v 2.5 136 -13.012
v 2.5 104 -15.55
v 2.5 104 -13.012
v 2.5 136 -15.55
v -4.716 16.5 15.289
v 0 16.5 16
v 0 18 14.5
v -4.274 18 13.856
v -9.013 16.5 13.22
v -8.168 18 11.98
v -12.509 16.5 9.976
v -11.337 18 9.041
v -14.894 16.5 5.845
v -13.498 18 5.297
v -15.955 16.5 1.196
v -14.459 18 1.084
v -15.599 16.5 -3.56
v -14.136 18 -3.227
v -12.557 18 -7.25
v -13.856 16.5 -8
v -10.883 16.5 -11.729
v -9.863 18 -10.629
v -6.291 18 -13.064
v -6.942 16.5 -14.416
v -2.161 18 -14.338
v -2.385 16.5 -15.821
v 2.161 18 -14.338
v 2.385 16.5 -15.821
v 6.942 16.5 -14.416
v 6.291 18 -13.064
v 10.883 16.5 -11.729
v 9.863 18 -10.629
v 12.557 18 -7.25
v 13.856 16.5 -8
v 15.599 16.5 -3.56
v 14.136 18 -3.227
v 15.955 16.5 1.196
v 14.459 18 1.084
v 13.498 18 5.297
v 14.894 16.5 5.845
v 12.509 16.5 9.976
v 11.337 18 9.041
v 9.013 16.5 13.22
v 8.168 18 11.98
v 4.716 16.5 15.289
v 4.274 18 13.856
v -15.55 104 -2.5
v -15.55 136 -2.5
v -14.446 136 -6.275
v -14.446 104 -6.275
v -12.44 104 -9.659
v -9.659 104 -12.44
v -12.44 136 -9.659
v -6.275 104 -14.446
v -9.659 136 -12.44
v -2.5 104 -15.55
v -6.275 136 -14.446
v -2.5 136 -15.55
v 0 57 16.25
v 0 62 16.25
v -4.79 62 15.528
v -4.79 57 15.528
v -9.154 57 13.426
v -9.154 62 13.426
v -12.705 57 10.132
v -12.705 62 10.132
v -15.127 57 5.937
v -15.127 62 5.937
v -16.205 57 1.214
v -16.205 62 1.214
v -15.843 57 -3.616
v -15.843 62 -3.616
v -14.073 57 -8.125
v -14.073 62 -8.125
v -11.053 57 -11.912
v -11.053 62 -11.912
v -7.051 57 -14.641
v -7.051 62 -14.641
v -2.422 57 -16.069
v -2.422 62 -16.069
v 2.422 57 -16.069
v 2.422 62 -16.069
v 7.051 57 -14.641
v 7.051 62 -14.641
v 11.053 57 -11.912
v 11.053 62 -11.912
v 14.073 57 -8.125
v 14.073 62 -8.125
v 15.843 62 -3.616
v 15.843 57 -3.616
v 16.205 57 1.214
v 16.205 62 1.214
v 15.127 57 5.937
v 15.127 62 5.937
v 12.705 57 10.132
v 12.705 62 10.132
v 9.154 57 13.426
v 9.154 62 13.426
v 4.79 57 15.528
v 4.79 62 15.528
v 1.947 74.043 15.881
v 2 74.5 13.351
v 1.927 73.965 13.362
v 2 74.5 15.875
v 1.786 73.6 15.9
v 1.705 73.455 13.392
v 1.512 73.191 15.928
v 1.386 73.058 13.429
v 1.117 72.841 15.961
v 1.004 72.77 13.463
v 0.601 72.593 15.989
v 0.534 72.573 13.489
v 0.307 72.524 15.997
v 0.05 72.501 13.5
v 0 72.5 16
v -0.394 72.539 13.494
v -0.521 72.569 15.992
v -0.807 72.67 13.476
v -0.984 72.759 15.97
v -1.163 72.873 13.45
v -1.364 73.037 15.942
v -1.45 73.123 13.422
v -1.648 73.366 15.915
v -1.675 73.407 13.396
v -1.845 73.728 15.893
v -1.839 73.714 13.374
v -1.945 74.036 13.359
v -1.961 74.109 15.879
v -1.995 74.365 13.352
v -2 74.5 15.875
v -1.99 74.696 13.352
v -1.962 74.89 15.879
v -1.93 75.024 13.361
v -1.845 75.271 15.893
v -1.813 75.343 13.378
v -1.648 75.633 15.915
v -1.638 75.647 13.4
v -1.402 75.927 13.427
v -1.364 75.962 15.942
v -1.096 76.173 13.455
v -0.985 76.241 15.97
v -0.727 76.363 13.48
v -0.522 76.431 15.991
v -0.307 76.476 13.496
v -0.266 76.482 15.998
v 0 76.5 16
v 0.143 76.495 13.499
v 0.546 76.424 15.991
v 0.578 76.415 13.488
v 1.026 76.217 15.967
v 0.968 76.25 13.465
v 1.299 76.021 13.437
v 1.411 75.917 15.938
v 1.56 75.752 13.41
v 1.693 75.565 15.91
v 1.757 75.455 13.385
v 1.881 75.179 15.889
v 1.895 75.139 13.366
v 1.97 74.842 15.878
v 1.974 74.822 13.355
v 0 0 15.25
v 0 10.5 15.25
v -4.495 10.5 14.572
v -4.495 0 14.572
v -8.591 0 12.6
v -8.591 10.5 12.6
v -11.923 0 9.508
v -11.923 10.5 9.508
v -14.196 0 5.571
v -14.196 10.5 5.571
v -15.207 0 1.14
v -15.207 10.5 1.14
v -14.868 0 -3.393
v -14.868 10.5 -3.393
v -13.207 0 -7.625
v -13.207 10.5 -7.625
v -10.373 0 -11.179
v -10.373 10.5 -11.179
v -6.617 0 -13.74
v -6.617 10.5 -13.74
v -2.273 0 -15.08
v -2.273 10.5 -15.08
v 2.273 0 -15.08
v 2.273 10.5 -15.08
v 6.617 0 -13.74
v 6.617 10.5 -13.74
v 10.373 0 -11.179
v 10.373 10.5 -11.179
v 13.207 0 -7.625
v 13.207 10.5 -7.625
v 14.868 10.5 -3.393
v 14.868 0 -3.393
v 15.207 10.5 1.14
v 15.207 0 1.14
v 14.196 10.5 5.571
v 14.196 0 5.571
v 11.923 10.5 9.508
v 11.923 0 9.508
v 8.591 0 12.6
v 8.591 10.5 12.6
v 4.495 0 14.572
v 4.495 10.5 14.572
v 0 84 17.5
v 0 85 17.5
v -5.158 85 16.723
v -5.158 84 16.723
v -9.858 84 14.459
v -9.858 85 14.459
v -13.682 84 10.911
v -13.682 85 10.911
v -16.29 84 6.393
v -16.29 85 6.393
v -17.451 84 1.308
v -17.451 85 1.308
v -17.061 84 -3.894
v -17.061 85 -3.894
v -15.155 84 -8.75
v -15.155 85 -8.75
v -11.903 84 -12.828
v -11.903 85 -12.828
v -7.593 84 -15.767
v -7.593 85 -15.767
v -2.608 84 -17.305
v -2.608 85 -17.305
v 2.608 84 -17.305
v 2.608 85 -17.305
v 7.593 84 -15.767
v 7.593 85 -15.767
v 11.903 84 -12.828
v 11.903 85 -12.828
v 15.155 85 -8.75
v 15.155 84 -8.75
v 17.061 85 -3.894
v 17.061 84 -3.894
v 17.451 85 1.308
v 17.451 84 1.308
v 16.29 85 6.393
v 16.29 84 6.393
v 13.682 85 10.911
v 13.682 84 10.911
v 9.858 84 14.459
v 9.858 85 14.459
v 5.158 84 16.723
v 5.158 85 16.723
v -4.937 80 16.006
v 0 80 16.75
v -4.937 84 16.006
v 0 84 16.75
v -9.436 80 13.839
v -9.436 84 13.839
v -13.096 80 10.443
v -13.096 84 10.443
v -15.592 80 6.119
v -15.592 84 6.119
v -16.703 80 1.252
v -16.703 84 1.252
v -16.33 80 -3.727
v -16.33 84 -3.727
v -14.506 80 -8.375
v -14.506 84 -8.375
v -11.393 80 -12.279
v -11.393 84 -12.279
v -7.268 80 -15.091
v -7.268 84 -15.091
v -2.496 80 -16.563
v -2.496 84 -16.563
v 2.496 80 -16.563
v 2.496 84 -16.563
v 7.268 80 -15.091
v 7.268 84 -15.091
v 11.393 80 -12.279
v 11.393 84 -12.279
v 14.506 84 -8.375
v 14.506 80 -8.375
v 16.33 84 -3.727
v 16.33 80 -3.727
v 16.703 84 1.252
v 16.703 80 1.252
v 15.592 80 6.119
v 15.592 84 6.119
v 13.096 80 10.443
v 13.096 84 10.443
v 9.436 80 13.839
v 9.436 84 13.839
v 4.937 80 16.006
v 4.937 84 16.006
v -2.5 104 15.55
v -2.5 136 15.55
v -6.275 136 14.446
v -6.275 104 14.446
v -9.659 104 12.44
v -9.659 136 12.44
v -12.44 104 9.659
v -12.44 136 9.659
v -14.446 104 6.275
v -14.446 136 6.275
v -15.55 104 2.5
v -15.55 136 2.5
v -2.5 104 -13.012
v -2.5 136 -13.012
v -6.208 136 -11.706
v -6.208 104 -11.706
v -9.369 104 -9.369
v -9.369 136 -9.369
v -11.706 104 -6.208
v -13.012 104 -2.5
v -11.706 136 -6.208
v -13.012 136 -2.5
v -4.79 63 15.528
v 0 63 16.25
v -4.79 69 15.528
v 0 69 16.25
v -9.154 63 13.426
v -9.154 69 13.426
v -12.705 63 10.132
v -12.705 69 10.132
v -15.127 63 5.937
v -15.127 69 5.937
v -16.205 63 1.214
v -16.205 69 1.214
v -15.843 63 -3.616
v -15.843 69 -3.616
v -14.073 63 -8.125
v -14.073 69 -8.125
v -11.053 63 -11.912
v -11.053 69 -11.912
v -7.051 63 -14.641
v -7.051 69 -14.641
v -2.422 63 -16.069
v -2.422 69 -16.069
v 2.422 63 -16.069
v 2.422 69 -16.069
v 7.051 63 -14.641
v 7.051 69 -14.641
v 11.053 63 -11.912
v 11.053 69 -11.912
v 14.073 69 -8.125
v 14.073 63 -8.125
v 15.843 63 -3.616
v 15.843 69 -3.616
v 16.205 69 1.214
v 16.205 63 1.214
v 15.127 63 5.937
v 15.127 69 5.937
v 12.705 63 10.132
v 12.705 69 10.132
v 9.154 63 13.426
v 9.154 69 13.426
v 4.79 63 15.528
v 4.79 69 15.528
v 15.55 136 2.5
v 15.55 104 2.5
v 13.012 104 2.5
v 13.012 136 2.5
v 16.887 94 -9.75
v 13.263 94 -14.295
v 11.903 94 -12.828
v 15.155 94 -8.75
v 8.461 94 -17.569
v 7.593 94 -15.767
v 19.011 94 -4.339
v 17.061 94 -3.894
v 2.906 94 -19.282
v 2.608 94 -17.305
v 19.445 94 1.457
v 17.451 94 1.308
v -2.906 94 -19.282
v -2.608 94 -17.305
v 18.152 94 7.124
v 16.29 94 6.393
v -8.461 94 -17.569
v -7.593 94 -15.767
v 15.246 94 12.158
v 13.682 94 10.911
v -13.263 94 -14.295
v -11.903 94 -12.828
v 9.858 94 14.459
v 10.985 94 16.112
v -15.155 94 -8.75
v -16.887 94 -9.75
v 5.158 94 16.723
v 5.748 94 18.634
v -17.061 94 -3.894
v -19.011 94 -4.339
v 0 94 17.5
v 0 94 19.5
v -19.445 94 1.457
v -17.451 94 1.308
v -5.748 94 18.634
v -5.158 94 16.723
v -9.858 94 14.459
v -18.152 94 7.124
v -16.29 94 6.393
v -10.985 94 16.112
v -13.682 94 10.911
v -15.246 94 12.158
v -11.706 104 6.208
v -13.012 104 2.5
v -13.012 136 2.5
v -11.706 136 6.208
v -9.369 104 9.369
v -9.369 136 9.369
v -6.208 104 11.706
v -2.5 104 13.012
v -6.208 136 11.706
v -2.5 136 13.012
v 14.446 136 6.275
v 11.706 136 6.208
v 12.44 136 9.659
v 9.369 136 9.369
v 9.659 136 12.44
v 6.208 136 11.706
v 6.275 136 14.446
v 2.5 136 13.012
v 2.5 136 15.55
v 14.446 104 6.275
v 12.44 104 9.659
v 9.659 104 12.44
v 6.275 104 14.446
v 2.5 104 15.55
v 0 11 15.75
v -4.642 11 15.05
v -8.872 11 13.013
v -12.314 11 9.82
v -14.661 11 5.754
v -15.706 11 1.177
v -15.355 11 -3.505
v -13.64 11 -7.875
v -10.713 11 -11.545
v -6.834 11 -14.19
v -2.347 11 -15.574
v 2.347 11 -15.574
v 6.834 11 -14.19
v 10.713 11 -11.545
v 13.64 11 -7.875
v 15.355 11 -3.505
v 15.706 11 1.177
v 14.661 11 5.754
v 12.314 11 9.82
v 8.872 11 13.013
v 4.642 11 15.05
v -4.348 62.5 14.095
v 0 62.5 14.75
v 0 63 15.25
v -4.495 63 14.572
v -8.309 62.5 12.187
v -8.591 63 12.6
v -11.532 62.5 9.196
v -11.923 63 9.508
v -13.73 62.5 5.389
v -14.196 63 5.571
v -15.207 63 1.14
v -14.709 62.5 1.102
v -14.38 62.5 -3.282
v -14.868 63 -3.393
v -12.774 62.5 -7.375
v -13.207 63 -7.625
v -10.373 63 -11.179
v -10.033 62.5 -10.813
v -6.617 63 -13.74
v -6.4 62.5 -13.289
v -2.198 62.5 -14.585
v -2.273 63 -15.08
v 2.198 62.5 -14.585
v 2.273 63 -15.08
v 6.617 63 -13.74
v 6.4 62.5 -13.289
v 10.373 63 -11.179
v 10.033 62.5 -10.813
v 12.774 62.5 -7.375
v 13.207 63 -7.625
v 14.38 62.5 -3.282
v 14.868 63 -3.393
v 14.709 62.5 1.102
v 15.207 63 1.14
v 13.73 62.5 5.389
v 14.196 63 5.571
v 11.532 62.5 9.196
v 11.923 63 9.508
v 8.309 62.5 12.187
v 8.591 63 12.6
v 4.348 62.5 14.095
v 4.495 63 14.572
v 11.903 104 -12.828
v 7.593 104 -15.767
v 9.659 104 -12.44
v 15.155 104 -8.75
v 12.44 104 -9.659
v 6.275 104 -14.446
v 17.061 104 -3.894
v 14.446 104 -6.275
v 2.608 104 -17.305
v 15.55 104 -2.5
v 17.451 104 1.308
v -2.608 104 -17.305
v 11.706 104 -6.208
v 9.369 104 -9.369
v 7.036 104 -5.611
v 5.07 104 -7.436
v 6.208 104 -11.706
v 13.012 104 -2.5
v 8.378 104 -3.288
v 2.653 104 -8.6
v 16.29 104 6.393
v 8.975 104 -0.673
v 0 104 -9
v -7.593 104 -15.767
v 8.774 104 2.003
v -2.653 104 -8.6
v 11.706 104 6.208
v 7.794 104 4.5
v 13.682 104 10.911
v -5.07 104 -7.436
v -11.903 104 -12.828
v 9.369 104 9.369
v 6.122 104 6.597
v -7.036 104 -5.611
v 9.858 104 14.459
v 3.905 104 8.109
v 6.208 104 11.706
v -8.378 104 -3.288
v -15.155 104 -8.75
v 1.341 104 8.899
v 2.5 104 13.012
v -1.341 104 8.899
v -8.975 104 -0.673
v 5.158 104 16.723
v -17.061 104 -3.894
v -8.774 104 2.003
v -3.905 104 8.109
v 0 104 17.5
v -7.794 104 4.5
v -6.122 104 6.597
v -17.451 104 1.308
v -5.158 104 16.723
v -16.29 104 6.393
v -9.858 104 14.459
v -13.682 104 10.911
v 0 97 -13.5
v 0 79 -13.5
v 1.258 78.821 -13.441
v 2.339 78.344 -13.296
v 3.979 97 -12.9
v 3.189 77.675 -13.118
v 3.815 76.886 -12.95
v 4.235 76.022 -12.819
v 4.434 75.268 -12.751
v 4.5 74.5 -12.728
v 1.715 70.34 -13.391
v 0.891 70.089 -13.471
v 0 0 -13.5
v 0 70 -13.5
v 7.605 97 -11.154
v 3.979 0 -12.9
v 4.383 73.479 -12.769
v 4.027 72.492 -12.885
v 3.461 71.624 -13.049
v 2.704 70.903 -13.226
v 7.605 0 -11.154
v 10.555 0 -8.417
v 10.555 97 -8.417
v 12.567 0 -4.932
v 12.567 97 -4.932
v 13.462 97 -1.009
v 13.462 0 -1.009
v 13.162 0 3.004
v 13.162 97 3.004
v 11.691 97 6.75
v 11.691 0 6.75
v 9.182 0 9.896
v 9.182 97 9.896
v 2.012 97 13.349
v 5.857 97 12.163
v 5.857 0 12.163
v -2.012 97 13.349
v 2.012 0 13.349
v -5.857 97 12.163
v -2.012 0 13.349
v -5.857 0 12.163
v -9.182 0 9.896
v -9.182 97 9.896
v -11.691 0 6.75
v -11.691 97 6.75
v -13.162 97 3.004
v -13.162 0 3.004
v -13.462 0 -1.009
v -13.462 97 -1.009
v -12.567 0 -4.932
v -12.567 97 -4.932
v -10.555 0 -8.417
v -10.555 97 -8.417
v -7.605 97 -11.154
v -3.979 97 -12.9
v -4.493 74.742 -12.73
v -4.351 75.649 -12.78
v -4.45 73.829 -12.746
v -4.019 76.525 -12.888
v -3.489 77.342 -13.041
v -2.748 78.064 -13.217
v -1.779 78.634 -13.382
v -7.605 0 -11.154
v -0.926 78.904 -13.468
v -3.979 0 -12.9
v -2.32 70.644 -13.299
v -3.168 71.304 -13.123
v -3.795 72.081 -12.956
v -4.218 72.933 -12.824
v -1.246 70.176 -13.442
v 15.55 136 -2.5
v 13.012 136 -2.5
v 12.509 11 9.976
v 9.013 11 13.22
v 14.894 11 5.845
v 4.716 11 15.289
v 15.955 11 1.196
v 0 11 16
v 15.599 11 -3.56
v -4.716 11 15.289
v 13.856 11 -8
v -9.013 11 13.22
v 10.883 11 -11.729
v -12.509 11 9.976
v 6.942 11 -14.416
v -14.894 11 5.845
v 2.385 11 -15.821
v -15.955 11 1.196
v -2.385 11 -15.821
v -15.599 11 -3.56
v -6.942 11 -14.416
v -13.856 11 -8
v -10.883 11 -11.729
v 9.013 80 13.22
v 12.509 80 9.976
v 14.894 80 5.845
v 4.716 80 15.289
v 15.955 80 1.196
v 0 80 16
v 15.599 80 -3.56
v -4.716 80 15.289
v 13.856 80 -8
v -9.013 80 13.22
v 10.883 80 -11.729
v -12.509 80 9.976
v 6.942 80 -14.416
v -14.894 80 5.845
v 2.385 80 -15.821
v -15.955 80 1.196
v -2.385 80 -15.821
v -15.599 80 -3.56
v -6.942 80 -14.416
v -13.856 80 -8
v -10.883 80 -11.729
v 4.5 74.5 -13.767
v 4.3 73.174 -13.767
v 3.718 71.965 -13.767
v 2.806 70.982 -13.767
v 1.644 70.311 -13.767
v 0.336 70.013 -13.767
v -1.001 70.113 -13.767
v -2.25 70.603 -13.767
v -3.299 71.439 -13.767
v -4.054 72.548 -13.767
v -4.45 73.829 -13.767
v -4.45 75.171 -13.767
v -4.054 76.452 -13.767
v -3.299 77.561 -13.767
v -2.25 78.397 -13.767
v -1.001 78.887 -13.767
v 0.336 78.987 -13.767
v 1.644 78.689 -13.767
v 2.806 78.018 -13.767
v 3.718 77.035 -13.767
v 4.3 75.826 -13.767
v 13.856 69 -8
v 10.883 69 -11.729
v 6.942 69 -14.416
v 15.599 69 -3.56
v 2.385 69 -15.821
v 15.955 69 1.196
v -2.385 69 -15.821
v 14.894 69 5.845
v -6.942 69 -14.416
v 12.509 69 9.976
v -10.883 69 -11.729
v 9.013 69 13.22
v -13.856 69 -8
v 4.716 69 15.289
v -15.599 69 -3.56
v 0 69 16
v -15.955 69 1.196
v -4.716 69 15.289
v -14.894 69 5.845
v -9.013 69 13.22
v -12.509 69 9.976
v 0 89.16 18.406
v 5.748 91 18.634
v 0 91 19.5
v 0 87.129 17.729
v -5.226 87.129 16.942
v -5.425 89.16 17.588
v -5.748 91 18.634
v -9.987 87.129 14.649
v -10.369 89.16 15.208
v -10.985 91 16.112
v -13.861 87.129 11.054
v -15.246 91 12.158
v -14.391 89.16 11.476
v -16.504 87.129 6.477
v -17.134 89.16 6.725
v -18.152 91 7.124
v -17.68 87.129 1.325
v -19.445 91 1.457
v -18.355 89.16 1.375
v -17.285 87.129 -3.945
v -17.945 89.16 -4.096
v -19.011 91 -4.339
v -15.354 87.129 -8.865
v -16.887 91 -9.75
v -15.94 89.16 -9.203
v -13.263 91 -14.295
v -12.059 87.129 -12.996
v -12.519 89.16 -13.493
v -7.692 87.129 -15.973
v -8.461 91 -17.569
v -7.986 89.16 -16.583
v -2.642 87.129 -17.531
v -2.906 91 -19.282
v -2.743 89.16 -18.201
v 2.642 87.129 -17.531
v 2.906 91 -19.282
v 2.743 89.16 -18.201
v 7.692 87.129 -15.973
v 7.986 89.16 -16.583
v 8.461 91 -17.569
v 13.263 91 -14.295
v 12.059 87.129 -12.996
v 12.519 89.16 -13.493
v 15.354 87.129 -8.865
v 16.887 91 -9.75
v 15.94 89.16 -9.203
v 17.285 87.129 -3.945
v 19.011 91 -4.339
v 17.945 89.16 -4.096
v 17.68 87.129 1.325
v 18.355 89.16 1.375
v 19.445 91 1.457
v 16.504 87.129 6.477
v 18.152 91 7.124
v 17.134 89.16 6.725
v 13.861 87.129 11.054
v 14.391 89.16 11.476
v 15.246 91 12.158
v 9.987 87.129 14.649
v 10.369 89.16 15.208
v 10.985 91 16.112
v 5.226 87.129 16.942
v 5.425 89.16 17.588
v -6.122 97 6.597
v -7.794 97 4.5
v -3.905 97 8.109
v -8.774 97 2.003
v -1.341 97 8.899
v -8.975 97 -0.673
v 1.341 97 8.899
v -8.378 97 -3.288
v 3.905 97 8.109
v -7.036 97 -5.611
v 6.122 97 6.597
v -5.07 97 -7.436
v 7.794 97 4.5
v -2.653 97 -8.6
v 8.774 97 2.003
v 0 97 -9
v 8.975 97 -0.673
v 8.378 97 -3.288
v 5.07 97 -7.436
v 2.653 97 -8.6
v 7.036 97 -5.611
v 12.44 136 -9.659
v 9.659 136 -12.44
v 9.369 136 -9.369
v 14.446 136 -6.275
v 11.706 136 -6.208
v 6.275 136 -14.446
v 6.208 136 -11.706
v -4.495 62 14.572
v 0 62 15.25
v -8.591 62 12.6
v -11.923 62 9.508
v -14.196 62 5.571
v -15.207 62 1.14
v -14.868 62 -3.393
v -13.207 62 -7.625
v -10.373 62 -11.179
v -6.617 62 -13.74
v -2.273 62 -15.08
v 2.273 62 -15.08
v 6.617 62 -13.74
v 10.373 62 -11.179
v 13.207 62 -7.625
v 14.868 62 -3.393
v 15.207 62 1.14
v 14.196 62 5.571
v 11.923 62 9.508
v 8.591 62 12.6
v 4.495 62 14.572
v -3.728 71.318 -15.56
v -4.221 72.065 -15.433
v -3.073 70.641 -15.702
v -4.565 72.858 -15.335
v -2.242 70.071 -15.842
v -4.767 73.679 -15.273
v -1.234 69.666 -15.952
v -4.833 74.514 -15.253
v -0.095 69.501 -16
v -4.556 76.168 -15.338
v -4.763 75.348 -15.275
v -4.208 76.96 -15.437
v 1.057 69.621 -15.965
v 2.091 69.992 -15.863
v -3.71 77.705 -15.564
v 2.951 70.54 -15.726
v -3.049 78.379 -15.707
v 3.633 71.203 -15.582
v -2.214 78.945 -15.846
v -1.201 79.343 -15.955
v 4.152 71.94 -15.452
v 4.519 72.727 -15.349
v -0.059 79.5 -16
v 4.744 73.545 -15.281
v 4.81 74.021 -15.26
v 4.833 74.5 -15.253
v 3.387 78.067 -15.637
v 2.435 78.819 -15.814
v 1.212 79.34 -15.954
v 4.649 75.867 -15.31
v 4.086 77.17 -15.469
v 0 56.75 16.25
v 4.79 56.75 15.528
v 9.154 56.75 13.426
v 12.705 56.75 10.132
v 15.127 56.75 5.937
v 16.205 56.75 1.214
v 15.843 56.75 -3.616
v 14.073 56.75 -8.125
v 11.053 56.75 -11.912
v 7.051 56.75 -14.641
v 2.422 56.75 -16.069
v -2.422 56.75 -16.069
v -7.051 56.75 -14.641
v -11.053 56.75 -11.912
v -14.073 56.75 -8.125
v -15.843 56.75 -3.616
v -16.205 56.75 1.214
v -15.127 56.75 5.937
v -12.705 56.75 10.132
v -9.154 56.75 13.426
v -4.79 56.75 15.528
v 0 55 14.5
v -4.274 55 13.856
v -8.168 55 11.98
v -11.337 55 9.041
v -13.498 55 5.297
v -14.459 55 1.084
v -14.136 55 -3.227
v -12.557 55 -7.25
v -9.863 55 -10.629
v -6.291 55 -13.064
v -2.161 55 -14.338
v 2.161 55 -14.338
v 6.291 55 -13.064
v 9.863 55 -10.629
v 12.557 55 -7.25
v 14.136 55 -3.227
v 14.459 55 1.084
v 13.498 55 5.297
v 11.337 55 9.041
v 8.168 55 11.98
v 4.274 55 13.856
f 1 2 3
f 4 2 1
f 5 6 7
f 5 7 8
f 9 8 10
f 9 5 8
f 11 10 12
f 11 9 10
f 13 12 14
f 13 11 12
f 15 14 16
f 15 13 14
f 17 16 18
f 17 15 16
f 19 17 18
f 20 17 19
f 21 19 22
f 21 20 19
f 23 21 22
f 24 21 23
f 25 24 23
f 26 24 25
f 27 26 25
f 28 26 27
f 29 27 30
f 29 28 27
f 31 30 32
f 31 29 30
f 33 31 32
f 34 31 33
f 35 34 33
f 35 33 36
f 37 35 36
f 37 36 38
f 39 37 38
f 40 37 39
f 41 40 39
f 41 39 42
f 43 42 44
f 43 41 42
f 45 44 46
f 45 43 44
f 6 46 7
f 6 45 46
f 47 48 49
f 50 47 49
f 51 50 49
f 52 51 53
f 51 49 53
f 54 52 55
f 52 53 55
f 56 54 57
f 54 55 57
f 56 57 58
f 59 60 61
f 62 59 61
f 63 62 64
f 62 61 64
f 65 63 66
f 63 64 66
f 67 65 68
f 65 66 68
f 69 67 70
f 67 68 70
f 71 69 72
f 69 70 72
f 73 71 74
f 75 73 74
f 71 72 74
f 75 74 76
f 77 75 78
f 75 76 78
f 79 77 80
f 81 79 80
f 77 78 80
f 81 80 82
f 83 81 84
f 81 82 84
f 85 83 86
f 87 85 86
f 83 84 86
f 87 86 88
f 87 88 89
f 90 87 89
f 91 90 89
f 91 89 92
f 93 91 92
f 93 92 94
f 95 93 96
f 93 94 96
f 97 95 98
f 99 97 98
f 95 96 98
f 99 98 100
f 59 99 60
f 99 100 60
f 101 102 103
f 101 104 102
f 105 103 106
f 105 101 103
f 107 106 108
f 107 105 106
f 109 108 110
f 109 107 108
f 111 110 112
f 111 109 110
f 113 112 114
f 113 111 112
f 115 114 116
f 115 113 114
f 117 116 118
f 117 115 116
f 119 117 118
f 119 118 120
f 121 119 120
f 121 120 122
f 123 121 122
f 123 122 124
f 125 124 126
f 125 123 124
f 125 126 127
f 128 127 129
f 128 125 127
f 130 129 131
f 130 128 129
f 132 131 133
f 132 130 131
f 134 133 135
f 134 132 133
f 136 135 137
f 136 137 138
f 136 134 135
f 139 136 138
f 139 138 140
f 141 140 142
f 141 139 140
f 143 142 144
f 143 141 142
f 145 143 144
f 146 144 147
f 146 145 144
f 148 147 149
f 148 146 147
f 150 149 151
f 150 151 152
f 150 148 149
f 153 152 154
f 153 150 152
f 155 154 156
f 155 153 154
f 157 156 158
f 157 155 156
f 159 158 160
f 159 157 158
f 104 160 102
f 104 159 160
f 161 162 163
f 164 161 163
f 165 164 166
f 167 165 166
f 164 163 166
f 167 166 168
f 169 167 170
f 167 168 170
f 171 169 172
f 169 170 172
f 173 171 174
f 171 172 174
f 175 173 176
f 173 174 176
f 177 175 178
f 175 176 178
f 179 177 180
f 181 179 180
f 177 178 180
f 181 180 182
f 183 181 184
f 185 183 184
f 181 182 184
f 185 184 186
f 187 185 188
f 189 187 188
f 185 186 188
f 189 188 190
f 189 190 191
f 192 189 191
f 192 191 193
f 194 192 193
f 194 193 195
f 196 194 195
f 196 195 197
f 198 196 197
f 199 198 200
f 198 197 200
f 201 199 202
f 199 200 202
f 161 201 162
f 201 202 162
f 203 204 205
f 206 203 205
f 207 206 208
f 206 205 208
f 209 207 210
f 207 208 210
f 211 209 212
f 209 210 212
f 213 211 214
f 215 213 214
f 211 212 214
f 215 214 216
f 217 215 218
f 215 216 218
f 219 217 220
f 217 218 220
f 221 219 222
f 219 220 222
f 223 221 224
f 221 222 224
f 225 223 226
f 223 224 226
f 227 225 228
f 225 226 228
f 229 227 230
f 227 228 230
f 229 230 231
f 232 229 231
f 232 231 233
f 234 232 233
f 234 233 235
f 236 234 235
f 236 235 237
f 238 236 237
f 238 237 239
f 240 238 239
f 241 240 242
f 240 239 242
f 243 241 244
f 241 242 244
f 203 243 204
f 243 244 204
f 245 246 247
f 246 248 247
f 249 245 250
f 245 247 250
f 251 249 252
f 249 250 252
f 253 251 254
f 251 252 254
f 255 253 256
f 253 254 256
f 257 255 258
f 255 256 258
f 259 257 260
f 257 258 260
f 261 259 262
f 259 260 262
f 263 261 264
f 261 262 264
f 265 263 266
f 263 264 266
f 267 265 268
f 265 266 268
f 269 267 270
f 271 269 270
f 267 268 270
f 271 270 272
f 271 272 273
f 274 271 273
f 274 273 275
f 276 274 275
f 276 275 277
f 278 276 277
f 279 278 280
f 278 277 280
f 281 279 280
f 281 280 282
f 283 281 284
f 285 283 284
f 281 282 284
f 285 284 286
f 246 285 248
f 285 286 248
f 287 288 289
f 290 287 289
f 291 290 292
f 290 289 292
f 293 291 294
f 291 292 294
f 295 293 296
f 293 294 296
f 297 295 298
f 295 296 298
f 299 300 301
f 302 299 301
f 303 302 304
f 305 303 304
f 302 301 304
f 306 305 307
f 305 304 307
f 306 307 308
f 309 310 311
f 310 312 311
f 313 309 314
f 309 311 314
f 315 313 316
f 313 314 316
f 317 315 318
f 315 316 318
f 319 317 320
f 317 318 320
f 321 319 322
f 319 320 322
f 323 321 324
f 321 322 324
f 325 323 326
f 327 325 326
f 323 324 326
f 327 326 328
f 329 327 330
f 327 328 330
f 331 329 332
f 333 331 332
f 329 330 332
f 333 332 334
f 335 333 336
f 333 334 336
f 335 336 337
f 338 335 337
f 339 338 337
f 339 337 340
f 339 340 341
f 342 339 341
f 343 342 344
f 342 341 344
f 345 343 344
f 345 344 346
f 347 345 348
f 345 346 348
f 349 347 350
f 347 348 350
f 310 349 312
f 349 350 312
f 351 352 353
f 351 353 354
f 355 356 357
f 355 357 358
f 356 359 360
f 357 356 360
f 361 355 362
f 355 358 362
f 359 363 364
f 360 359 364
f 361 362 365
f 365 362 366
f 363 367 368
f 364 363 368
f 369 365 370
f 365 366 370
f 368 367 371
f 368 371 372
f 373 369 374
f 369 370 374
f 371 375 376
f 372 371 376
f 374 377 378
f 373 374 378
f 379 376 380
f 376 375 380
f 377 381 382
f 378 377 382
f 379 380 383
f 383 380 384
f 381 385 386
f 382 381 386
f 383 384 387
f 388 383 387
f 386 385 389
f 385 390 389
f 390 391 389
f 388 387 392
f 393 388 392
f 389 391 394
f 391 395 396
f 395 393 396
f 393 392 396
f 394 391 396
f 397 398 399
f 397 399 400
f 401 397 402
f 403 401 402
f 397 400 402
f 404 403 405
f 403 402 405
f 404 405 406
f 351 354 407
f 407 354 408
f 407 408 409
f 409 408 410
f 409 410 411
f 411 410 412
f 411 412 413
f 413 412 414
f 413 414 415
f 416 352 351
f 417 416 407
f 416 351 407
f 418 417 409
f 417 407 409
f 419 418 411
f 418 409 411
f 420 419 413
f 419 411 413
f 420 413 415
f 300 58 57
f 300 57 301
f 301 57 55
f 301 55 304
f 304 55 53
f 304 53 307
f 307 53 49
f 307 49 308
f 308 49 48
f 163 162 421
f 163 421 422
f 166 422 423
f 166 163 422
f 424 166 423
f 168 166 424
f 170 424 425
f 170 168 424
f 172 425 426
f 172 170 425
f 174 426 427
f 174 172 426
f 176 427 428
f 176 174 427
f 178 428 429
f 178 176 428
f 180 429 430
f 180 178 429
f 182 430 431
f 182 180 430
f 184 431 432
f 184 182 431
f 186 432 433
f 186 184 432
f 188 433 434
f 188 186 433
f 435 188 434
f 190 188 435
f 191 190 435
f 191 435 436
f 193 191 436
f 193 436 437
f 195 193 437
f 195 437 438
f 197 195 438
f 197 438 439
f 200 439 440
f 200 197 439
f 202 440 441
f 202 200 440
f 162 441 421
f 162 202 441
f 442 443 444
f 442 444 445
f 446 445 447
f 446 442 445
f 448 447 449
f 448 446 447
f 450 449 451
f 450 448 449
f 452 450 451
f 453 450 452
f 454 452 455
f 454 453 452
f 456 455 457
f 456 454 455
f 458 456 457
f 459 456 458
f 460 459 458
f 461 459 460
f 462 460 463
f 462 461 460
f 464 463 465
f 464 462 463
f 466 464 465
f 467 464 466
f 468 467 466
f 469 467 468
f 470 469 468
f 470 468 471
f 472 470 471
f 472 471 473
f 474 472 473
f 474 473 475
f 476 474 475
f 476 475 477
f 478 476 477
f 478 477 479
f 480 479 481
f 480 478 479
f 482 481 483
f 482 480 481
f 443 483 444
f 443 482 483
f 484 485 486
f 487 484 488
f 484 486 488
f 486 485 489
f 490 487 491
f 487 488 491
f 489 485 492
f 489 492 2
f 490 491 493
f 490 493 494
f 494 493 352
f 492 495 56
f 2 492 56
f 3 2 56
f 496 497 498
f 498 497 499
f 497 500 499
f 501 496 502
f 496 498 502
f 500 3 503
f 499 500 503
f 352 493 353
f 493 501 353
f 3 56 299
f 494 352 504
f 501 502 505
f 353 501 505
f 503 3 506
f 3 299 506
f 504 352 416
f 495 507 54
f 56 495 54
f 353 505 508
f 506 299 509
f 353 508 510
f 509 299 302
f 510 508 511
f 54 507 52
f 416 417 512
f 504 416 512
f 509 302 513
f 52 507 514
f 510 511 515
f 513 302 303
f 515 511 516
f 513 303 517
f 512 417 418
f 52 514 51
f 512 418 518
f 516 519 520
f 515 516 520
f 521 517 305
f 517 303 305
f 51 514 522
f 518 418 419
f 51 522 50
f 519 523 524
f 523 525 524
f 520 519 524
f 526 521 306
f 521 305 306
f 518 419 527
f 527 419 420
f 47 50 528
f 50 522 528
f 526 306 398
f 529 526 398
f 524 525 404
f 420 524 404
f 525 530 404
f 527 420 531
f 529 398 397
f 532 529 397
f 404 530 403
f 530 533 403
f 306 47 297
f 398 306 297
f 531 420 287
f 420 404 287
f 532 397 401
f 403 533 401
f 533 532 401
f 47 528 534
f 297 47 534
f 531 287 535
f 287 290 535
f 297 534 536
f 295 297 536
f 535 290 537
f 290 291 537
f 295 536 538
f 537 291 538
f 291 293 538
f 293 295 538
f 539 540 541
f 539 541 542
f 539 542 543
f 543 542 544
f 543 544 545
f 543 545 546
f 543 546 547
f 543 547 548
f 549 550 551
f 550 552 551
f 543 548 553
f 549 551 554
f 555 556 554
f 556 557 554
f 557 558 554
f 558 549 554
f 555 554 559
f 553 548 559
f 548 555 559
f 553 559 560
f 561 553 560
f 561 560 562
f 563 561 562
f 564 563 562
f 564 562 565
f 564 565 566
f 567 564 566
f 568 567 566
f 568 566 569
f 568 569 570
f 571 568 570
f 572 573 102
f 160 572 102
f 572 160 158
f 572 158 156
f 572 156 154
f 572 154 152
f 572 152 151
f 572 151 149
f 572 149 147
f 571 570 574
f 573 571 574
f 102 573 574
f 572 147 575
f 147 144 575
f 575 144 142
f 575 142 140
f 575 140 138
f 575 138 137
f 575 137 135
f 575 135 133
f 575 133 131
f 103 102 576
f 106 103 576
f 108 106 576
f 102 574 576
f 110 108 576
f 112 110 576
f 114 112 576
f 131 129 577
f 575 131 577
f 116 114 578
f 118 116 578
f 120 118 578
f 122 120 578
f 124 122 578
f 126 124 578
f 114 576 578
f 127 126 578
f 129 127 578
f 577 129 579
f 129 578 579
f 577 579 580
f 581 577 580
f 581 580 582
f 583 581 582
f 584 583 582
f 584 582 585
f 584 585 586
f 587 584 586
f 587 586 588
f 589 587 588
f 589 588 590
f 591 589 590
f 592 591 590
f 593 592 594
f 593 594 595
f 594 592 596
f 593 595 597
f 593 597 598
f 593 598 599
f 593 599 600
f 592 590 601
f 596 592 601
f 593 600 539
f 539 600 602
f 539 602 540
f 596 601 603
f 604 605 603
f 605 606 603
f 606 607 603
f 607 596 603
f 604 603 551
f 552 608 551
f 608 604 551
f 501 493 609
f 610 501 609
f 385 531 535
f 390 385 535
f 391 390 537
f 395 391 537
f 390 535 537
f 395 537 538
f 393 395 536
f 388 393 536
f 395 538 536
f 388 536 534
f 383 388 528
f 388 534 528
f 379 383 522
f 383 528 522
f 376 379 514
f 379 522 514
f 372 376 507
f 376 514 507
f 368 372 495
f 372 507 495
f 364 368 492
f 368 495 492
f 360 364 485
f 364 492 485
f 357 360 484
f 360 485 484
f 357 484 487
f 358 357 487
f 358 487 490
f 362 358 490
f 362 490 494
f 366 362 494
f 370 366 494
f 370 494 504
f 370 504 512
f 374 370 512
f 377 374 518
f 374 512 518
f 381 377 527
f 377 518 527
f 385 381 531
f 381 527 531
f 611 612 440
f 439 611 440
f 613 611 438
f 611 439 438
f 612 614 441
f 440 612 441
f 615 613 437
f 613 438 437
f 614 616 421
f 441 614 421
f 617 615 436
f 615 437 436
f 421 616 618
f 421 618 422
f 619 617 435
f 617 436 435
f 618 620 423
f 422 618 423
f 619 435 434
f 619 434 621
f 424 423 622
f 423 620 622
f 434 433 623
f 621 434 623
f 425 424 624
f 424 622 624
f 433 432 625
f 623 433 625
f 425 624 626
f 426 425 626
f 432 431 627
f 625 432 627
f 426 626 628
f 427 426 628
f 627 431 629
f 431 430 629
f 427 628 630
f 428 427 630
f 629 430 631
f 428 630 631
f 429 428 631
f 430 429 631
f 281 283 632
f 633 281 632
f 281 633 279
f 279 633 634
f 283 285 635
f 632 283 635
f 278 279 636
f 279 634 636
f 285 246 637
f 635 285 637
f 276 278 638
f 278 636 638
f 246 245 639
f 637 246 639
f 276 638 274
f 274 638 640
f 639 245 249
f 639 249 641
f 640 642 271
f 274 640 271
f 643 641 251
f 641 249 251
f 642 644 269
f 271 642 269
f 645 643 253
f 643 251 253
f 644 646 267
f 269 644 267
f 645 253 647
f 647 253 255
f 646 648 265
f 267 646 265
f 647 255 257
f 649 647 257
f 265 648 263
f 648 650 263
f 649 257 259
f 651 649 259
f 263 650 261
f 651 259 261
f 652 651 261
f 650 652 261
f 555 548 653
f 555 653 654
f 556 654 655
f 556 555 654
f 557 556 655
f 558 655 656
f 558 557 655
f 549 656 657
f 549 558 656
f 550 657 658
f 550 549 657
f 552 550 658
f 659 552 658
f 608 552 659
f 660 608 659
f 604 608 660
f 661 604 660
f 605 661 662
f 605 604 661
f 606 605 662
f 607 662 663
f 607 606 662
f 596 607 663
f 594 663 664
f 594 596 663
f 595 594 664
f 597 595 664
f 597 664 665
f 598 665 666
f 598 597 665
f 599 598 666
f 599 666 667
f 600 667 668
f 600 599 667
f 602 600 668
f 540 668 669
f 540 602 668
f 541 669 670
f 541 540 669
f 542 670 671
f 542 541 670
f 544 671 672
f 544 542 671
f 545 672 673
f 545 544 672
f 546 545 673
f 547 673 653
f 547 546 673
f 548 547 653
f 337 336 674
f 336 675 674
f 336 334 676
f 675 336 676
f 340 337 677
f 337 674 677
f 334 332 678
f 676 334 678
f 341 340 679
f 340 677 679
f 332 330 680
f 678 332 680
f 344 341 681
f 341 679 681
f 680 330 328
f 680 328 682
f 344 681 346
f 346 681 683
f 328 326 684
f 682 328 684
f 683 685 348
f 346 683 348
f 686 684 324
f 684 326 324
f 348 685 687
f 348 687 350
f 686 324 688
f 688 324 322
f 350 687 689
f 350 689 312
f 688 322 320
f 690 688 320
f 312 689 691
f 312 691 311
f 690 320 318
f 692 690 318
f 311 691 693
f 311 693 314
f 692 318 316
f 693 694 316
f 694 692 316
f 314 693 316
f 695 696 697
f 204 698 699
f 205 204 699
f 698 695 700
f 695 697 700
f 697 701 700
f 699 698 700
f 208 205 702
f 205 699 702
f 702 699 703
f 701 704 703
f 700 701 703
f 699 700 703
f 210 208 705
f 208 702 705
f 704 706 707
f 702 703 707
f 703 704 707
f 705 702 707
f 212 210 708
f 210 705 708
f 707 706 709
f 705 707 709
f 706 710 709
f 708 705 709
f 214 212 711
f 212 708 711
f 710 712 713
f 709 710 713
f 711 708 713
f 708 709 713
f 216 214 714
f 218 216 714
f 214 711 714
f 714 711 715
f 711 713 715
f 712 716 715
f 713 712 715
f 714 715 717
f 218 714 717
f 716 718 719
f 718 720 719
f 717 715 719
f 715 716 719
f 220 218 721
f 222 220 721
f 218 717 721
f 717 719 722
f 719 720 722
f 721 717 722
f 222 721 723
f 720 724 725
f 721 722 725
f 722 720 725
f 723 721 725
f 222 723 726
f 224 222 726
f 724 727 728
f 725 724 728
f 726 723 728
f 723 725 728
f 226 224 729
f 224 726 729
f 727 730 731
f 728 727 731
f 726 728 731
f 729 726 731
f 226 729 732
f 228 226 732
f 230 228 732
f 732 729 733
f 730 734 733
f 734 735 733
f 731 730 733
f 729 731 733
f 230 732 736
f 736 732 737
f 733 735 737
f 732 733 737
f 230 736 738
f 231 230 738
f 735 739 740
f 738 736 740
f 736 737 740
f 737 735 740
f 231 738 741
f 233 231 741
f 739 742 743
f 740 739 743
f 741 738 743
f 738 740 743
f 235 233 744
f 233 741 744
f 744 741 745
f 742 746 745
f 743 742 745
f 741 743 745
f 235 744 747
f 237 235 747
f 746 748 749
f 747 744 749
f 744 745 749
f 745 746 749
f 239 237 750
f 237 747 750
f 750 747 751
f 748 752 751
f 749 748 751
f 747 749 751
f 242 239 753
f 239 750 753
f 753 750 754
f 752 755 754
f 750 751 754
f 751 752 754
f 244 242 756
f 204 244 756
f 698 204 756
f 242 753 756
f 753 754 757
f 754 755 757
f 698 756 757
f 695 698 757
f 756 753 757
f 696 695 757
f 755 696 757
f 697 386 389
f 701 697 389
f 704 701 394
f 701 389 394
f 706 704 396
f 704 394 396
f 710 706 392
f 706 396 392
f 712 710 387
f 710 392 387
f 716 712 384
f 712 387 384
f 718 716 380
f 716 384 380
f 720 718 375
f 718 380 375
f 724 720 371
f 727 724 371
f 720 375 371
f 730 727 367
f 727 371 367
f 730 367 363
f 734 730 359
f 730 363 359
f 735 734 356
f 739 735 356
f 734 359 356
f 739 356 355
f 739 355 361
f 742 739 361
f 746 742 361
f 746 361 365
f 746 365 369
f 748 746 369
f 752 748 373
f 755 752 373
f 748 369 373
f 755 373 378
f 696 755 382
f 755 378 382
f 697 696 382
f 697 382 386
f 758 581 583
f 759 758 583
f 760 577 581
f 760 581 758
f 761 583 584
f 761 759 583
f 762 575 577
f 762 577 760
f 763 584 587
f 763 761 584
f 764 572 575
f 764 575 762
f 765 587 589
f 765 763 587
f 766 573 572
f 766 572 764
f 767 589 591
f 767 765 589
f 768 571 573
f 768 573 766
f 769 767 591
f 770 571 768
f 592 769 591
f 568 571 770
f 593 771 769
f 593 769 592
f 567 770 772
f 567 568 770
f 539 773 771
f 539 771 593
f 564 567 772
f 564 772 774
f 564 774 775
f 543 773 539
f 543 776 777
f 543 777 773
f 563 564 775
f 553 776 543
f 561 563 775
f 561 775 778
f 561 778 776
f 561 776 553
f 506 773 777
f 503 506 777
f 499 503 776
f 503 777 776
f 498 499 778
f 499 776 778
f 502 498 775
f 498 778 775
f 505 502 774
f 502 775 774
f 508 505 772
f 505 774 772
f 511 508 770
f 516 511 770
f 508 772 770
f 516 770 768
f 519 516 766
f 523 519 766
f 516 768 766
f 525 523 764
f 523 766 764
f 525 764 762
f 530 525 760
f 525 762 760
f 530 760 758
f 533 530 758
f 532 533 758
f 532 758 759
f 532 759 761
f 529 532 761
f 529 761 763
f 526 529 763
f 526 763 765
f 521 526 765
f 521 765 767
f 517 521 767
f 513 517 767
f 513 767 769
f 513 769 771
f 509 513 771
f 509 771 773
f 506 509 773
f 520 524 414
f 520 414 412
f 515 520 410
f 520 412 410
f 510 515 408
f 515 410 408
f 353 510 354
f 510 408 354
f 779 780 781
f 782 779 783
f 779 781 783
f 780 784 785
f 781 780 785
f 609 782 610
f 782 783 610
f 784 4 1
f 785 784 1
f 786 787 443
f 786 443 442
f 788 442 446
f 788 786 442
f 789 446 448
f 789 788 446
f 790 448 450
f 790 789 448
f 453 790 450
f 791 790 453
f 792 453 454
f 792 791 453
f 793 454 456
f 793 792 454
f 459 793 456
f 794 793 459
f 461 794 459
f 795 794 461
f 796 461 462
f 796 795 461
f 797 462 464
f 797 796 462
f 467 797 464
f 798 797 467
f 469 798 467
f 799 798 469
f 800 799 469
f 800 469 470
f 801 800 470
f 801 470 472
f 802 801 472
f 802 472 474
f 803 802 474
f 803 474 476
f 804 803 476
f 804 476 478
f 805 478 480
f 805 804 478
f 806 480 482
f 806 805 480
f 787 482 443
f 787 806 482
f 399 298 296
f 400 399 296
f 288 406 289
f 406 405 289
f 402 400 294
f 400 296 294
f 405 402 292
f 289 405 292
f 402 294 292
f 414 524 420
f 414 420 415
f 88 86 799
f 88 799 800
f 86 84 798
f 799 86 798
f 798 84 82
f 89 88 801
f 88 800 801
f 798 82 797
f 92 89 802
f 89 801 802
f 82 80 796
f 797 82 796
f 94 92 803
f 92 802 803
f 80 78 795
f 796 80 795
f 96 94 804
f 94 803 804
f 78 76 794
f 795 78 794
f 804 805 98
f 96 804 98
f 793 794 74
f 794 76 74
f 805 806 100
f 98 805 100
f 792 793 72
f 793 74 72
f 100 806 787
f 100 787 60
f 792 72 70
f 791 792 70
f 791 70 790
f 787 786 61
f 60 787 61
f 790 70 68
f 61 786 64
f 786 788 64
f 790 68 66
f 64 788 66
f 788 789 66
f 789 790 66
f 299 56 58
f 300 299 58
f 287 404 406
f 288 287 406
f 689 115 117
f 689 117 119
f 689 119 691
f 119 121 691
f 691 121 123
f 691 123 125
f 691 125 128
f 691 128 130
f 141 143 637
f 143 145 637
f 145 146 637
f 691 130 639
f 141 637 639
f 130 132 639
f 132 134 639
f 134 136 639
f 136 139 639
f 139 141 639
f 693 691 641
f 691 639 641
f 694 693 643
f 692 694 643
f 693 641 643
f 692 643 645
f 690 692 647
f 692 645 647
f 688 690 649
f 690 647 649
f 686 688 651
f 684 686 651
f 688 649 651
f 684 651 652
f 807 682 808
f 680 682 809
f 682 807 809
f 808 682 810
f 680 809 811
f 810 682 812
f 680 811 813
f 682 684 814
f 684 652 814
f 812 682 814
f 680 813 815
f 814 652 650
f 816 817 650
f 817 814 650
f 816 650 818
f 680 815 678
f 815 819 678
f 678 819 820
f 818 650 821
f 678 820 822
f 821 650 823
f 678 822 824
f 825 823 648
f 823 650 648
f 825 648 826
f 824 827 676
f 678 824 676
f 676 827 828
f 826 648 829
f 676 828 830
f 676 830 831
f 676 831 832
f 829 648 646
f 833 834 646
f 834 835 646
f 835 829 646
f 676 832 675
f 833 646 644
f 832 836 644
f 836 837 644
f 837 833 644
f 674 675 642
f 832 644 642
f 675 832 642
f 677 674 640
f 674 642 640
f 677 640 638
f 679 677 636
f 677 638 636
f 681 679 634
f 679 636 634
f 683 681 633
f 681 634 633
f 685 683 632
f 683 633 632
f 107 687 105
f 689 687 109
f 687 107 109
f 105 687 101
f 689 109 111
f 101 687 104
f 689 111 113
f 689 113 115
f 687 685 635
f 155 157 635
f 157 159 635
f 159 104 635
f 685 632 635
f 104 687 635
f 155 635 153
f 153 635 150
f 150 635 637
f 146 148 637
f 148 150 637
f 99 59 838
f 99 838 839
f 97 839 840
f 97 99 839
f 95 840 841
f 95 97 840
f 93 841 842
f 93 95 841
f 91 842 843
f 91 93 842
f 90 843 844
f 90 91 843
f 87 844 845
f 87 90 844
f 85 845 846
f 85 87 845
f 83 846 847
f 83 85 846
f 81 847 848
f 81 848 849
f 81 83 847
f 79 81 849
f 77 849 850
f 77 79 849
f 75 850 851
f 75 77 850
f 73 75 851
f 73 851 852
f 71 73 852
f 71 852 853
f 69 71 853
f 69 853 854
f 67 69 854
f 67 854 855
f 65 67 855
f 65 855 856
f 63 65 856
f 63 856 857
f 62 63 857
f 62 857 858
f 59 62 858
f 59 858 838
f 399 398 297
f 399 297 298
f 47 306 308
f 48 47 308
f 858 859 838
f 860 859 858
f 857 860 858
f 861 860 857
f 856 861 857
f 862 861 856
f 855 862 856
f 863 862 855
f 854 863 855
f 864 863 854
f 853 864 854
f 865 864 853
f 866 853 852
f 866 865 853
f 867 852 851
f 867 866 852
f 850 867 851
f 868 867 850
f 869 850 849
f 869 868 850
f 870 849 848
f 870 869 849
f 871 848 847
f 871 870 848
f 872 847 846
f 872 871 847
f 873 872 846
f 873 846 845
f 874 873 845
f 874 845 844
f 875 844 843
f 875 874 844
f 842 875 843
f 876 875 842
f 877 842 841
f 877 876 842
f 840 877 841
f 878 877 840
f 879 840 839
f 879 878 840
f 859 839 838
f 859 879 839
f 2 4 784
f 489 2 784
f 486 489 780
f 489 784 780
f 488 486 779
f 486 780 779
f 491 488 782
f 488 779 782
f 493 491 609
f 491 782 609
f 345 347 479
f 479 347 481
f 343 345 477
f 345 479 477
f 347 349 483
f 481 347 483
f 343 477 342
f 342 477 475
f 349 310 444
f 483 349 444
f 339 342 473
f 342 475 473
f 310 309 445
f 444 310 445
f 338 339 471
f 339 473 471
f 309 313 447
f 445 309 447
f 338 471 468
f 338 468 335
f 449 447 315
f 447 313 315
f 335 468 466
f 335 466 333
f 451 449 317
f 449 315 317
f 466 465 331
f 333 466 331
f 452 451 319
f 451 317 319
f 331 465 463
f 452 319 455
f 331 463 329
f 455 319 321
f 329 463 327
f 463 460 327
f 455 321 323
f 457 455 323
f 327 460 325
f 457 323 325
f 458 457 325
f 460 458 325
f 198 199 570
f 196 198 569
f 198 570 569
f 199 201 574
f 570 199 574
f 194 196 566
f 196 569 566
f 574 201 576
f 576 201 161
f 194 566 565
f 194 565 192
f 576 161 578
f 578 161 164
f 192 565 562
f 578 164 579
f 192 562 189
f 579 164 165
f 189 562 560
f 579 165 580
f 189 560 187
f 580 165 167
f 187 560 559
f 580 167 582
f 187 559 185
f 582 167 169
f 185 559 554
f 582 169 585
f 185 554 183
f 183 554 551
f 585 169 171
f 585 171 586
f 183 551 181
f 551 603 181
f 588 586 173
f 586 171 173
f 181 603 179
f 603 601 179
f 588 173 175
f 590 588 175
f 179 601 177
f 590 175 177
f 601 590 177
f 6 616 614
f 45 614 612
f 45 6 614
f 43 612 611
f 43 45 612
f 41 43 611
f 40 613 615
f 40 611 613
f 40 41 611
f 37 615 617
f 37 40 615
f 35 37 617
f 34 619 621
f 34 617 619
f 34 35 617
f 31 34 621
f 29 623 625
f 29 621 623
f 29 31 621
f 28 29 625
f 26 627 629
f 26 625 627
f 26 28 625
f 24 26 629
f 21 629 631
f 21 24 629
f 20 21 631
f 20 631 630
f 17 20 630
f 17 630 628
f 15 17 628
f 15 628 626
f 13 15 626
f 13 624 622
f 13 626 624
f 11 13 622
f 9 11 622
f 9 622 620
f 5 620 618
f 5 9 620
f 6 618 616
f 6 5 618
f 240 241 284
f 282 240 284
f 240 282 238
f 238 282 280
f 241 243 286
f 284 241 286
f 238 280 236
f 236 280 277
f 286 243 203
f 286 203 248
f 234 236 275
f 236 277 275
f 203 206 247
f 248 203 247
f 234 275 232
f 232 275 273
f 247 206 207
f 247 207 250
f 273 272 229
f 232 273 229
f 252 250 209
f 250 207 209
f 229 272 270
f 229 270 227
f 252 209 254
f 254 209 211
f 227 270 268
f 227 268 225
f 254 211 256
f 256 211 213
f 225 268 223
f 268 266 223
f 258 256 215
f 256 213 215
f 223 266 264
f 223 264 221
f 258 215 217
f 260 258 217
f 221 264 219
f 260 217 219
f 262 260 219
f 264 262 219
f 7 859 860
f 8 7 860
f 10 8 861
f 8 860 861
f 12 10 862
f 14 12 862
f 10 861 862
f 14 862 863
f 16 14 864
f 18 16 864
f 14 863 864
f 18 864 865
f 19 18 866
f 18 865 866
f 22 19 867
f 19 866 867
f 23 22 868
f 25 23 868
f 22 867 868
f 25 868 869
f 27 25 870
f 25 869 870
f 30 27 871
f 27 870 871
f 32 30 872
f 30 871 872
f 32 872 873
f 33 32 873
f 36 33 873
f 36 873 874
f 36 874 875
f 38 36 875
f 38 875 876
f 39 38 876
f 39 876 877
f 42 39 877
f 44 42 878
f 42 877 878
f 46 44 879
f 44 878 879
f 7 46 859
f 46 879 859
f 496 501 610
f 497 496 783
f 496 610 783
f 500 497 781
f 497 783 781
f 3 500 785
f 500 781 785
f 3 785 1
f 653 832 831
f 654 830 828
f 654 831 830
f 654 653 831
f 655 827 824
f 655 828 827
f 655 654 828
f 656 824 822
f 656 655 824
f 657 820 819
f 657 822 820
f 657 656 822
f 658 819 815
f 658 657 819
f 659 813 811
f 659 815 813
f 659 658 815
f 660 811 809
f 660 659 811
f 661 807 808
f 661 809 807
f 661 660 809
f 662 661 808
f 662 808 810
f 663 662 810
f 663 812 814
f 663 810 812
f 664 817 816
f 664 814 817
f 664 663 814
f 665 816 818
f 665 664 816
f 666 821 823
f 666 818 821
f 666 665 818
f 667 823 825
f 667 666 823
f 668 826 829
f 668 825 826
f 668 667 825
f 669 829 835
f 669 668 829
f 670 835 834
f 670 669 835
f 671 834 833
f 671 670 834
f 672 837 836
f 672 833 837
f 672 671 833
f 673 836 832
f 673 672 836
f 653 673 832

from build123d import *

# Parameters (mm, degrees)
CROQUIS2_W            = 5
CROQUIS2_H            = 39.415776956
CORTAR_EXTRUIR1_DEPTH = 22.5
MATRIZC2_COUNT        = 3
MATRIZC2_ANGLE        = 180
CROQUIS3_R            = 13.25
CORTAR_EXTRUIR2_DEPTH = 32
REDONDEO2_R           = 10
CHAFL_N1_SIZE         = 0.5
CHAFL_N2_SIZE         = 2
CROQUIS4_R            = 9
CORTAR_EXTRUIR3_DEPTH = 139.767791652
CROQUIS4_3_R          = 13.5
CROQUIS4_3_R_2        = 9
CORTAR_EXTRUIR4_DEPTH = 97


# Some blends are built 0.0001 mm under size
with BuildPart() as part:
    # Croquis1 → Revolución1 (revolve)
    with BuildSketch(Plane(origin=(0, 0, 0), x_dir=(0, 0, -1), z_dir=(1, 0, 0))):
        Polygon((0, 0), (-15.25, 0), (-15.25, 11), (-16, 11), (-16, 16), (-14.5, 16), (-14.5, 57), (-16.25, 57), (-16.25, 62), (-14.75, 62), (-14.75, 63), (-16.25, 63), (-16.25, 69), (-16, 69), (-16, 80), (-16.75, 80), (-16.75, 84), (-17.5, 84), (-17.5, 91), (-19.5, 91), (-19.5, 94), (-17.5, 94), (-17.5, 104), (-15.75, 104), (-15.75, 136), (0, 136), align=None)
    revolve(axis=Axis((0, 136, 0), (0, -1, 0)))

    # Croquis2 → Cortar-Extruir1 (cut, symmetric)
    with BuildSketch(Plane(origin=(0, 0, 0), x_dir=(0, 0, -1), z_dir=(1, 0, 0))):
        with Locations((0, 123.707888478)):
            Rectangle(CROQUIS2_W, CROQUIS2_H)
    cortar_extruir1 = extrude(amount=CORTAR_EXTRUIR1_DEPTH, both=True, mode=Mode.SUBTRACT)

    # MatrizC2: Cortar-Extruir1 ×3 about axis
    matrizc2_axis = Axis((0, 136, 0), (0, 1, 0))
    for i in range(1, MATRIZC2_COUNT):
        add(cortar_extruir1.rotate(matrizc2_axis, i * MATRIZC2_ANGLE / (MATRIZC2_COUNT - 1)), mode=Mode.SUBTRACT)

    # Croquis3 → Cortar-Extruir2 (cut)
    with BuildSketch(Plane(origin=(0, 136, 0), x_dir=(1, 0, 0), z_dir=(0, 1, 0))):
        Circle(CROQUIS3_R)
    extrude(amount=-CORTAR_EXTRUIR2_DEPTH, mode=Mode.SUBTRACT)

    # Redondeo2
    # the kernel refuses this fillet: 10 mm, written as the material it adds along each edge
    with BuildSketch(Plane(origin=(0, 91, 0), x_dir=(0, 0, 1), z_dir=(1, 0, 0))) as redondeo2_piece_1:
        with BuildLine():
            CenterArc((27.5, 6), REDONDEO2_R, 180, 36.869897646)
            Line((19.5, 0), (17.5, 0))
            Line((17.5, 0), (17.5, 6))
        make_face()
    revolve(axis=Axis((0, 91, 0), (0, -1, 0)))

    # Chaflán1
    chafl_n1_edges = [part.edges().sort_by_distance(p)[0] for p in [
        (0, 63, -14.75),
        (0, 62, -14.75),
        (0, 11, -15.25),
    ]]
    chamfer(chafl_n1_edges, length=CHAFL_N1_SIZE - 0.0001)  # a hair under: the kernel refuses the full size

    # Chaflán2
    # the kernel refuses this chamfer: 2 mm, written as the material it adds along each edge
    with BuildSketch(Plane(origin=(0, 16, 0), x_dir=(0, 0, 1), z_dir=(1, 0, 0))) as chafl_n2_piece_1_section:
        Polygon((14.5, -CHAFL_N2_SIZE), (14.5 + CHAFL_N2_SIZE, 0), (14.5, 0), align=None)
    chafl_n2_piece_1 = revolve(axis=Axis((0, 16, 0), (0, -1, 0)), mode=Mode.PRIVATE)
    chafl_n2_piece_1 = chafl_n2_piece_1 & Plane(origin=(0, 16, 0), x_dir=(0, 0, 1), z_dir=(0, 1, 0)) * Cylinder(16, 66, mode=Mode.PRIVATE)
    add(chafl_n2_piece_1)
    with BuildSketch(Plane(origin=(0, 57, 0), x_dir=(0, 0, 1), z_dir=(1, 0, 0))) as chafl_n2_piece_2_section:
        Polygon((14.5 + CHAFL_N2_SIZE, 0), (14.5, CHAFL_N2_SIZE), (14.5, 0), align=None)
    chafl_n2_piece_2 = revolve(axis=Axis((0, 57, 0), (0, -1, 0)), mode=Mode.PRIVATE)
    chafl_n2_piece_2 = chafl_n2_piece_2 & Plane(origin=(0, 57, 0), x_dir=(0, 0, 1), z_dir=(0, 1, 0)) * Cylinder(16.25, 66, mode=Mode.PRIVATE)
    add(chafl_n2_piece_2)

    # Croquis4 → Cortar-Extruir3 (cut, through all)
    with BuildSketch(Plane.XZ):
        with Locations(Location((0, 0, 0), (0, 0, 270))):
            Circle(CROQUIS4_R)
    extrude(amount=-CORTAR_EXTRUIR3_DEPTH, mode=Mode.SUBTRACT)

    # Croquis4<3> → Cortar-Extruir4 (cut)
    with BuildSketch(Plane.XZ):
        with Locations(Location((0, 0, 0), (0, 0, 270))):
            Circle(CROQUIS4_3_R)
        with Locations(Location((0, 0, 0), (0, 0, 90))):
            Circle(CROQUIS4_3_R_2, mode=Mode.SUBTRACT)
    extrude(amount=-CORTAR_EXTRUIR4_DEPTH, mode=Mode.SUBTRACT)

    # Croquis6 → Cortar-Revolución1 (revolve, cut)
    with BuildSketch(Plane(origin=(0, 0, 0), x_dir=(0, 0, -1), z_dir=(1, 0, 0)), mode=Mode.PRIVATE) as cortar_revoluci_n1_sk:
        Polygon((16, 79.5), (13.766586279, 79), (3.766586279, 79), (3.766586279, 76.5), (-16, 76.5), (-16, 74.5), (16, 74.5), align=None)
    revolve(cortar_revoluci_n1_sk.sketch.rotate(Axis((0, 74.5, 16), (0, 0, -1)), 90), axis=Axis((0, 74.5, 16), (0, 0, -1)), mode=Mode.SUBTRACT)


solid = part.part
